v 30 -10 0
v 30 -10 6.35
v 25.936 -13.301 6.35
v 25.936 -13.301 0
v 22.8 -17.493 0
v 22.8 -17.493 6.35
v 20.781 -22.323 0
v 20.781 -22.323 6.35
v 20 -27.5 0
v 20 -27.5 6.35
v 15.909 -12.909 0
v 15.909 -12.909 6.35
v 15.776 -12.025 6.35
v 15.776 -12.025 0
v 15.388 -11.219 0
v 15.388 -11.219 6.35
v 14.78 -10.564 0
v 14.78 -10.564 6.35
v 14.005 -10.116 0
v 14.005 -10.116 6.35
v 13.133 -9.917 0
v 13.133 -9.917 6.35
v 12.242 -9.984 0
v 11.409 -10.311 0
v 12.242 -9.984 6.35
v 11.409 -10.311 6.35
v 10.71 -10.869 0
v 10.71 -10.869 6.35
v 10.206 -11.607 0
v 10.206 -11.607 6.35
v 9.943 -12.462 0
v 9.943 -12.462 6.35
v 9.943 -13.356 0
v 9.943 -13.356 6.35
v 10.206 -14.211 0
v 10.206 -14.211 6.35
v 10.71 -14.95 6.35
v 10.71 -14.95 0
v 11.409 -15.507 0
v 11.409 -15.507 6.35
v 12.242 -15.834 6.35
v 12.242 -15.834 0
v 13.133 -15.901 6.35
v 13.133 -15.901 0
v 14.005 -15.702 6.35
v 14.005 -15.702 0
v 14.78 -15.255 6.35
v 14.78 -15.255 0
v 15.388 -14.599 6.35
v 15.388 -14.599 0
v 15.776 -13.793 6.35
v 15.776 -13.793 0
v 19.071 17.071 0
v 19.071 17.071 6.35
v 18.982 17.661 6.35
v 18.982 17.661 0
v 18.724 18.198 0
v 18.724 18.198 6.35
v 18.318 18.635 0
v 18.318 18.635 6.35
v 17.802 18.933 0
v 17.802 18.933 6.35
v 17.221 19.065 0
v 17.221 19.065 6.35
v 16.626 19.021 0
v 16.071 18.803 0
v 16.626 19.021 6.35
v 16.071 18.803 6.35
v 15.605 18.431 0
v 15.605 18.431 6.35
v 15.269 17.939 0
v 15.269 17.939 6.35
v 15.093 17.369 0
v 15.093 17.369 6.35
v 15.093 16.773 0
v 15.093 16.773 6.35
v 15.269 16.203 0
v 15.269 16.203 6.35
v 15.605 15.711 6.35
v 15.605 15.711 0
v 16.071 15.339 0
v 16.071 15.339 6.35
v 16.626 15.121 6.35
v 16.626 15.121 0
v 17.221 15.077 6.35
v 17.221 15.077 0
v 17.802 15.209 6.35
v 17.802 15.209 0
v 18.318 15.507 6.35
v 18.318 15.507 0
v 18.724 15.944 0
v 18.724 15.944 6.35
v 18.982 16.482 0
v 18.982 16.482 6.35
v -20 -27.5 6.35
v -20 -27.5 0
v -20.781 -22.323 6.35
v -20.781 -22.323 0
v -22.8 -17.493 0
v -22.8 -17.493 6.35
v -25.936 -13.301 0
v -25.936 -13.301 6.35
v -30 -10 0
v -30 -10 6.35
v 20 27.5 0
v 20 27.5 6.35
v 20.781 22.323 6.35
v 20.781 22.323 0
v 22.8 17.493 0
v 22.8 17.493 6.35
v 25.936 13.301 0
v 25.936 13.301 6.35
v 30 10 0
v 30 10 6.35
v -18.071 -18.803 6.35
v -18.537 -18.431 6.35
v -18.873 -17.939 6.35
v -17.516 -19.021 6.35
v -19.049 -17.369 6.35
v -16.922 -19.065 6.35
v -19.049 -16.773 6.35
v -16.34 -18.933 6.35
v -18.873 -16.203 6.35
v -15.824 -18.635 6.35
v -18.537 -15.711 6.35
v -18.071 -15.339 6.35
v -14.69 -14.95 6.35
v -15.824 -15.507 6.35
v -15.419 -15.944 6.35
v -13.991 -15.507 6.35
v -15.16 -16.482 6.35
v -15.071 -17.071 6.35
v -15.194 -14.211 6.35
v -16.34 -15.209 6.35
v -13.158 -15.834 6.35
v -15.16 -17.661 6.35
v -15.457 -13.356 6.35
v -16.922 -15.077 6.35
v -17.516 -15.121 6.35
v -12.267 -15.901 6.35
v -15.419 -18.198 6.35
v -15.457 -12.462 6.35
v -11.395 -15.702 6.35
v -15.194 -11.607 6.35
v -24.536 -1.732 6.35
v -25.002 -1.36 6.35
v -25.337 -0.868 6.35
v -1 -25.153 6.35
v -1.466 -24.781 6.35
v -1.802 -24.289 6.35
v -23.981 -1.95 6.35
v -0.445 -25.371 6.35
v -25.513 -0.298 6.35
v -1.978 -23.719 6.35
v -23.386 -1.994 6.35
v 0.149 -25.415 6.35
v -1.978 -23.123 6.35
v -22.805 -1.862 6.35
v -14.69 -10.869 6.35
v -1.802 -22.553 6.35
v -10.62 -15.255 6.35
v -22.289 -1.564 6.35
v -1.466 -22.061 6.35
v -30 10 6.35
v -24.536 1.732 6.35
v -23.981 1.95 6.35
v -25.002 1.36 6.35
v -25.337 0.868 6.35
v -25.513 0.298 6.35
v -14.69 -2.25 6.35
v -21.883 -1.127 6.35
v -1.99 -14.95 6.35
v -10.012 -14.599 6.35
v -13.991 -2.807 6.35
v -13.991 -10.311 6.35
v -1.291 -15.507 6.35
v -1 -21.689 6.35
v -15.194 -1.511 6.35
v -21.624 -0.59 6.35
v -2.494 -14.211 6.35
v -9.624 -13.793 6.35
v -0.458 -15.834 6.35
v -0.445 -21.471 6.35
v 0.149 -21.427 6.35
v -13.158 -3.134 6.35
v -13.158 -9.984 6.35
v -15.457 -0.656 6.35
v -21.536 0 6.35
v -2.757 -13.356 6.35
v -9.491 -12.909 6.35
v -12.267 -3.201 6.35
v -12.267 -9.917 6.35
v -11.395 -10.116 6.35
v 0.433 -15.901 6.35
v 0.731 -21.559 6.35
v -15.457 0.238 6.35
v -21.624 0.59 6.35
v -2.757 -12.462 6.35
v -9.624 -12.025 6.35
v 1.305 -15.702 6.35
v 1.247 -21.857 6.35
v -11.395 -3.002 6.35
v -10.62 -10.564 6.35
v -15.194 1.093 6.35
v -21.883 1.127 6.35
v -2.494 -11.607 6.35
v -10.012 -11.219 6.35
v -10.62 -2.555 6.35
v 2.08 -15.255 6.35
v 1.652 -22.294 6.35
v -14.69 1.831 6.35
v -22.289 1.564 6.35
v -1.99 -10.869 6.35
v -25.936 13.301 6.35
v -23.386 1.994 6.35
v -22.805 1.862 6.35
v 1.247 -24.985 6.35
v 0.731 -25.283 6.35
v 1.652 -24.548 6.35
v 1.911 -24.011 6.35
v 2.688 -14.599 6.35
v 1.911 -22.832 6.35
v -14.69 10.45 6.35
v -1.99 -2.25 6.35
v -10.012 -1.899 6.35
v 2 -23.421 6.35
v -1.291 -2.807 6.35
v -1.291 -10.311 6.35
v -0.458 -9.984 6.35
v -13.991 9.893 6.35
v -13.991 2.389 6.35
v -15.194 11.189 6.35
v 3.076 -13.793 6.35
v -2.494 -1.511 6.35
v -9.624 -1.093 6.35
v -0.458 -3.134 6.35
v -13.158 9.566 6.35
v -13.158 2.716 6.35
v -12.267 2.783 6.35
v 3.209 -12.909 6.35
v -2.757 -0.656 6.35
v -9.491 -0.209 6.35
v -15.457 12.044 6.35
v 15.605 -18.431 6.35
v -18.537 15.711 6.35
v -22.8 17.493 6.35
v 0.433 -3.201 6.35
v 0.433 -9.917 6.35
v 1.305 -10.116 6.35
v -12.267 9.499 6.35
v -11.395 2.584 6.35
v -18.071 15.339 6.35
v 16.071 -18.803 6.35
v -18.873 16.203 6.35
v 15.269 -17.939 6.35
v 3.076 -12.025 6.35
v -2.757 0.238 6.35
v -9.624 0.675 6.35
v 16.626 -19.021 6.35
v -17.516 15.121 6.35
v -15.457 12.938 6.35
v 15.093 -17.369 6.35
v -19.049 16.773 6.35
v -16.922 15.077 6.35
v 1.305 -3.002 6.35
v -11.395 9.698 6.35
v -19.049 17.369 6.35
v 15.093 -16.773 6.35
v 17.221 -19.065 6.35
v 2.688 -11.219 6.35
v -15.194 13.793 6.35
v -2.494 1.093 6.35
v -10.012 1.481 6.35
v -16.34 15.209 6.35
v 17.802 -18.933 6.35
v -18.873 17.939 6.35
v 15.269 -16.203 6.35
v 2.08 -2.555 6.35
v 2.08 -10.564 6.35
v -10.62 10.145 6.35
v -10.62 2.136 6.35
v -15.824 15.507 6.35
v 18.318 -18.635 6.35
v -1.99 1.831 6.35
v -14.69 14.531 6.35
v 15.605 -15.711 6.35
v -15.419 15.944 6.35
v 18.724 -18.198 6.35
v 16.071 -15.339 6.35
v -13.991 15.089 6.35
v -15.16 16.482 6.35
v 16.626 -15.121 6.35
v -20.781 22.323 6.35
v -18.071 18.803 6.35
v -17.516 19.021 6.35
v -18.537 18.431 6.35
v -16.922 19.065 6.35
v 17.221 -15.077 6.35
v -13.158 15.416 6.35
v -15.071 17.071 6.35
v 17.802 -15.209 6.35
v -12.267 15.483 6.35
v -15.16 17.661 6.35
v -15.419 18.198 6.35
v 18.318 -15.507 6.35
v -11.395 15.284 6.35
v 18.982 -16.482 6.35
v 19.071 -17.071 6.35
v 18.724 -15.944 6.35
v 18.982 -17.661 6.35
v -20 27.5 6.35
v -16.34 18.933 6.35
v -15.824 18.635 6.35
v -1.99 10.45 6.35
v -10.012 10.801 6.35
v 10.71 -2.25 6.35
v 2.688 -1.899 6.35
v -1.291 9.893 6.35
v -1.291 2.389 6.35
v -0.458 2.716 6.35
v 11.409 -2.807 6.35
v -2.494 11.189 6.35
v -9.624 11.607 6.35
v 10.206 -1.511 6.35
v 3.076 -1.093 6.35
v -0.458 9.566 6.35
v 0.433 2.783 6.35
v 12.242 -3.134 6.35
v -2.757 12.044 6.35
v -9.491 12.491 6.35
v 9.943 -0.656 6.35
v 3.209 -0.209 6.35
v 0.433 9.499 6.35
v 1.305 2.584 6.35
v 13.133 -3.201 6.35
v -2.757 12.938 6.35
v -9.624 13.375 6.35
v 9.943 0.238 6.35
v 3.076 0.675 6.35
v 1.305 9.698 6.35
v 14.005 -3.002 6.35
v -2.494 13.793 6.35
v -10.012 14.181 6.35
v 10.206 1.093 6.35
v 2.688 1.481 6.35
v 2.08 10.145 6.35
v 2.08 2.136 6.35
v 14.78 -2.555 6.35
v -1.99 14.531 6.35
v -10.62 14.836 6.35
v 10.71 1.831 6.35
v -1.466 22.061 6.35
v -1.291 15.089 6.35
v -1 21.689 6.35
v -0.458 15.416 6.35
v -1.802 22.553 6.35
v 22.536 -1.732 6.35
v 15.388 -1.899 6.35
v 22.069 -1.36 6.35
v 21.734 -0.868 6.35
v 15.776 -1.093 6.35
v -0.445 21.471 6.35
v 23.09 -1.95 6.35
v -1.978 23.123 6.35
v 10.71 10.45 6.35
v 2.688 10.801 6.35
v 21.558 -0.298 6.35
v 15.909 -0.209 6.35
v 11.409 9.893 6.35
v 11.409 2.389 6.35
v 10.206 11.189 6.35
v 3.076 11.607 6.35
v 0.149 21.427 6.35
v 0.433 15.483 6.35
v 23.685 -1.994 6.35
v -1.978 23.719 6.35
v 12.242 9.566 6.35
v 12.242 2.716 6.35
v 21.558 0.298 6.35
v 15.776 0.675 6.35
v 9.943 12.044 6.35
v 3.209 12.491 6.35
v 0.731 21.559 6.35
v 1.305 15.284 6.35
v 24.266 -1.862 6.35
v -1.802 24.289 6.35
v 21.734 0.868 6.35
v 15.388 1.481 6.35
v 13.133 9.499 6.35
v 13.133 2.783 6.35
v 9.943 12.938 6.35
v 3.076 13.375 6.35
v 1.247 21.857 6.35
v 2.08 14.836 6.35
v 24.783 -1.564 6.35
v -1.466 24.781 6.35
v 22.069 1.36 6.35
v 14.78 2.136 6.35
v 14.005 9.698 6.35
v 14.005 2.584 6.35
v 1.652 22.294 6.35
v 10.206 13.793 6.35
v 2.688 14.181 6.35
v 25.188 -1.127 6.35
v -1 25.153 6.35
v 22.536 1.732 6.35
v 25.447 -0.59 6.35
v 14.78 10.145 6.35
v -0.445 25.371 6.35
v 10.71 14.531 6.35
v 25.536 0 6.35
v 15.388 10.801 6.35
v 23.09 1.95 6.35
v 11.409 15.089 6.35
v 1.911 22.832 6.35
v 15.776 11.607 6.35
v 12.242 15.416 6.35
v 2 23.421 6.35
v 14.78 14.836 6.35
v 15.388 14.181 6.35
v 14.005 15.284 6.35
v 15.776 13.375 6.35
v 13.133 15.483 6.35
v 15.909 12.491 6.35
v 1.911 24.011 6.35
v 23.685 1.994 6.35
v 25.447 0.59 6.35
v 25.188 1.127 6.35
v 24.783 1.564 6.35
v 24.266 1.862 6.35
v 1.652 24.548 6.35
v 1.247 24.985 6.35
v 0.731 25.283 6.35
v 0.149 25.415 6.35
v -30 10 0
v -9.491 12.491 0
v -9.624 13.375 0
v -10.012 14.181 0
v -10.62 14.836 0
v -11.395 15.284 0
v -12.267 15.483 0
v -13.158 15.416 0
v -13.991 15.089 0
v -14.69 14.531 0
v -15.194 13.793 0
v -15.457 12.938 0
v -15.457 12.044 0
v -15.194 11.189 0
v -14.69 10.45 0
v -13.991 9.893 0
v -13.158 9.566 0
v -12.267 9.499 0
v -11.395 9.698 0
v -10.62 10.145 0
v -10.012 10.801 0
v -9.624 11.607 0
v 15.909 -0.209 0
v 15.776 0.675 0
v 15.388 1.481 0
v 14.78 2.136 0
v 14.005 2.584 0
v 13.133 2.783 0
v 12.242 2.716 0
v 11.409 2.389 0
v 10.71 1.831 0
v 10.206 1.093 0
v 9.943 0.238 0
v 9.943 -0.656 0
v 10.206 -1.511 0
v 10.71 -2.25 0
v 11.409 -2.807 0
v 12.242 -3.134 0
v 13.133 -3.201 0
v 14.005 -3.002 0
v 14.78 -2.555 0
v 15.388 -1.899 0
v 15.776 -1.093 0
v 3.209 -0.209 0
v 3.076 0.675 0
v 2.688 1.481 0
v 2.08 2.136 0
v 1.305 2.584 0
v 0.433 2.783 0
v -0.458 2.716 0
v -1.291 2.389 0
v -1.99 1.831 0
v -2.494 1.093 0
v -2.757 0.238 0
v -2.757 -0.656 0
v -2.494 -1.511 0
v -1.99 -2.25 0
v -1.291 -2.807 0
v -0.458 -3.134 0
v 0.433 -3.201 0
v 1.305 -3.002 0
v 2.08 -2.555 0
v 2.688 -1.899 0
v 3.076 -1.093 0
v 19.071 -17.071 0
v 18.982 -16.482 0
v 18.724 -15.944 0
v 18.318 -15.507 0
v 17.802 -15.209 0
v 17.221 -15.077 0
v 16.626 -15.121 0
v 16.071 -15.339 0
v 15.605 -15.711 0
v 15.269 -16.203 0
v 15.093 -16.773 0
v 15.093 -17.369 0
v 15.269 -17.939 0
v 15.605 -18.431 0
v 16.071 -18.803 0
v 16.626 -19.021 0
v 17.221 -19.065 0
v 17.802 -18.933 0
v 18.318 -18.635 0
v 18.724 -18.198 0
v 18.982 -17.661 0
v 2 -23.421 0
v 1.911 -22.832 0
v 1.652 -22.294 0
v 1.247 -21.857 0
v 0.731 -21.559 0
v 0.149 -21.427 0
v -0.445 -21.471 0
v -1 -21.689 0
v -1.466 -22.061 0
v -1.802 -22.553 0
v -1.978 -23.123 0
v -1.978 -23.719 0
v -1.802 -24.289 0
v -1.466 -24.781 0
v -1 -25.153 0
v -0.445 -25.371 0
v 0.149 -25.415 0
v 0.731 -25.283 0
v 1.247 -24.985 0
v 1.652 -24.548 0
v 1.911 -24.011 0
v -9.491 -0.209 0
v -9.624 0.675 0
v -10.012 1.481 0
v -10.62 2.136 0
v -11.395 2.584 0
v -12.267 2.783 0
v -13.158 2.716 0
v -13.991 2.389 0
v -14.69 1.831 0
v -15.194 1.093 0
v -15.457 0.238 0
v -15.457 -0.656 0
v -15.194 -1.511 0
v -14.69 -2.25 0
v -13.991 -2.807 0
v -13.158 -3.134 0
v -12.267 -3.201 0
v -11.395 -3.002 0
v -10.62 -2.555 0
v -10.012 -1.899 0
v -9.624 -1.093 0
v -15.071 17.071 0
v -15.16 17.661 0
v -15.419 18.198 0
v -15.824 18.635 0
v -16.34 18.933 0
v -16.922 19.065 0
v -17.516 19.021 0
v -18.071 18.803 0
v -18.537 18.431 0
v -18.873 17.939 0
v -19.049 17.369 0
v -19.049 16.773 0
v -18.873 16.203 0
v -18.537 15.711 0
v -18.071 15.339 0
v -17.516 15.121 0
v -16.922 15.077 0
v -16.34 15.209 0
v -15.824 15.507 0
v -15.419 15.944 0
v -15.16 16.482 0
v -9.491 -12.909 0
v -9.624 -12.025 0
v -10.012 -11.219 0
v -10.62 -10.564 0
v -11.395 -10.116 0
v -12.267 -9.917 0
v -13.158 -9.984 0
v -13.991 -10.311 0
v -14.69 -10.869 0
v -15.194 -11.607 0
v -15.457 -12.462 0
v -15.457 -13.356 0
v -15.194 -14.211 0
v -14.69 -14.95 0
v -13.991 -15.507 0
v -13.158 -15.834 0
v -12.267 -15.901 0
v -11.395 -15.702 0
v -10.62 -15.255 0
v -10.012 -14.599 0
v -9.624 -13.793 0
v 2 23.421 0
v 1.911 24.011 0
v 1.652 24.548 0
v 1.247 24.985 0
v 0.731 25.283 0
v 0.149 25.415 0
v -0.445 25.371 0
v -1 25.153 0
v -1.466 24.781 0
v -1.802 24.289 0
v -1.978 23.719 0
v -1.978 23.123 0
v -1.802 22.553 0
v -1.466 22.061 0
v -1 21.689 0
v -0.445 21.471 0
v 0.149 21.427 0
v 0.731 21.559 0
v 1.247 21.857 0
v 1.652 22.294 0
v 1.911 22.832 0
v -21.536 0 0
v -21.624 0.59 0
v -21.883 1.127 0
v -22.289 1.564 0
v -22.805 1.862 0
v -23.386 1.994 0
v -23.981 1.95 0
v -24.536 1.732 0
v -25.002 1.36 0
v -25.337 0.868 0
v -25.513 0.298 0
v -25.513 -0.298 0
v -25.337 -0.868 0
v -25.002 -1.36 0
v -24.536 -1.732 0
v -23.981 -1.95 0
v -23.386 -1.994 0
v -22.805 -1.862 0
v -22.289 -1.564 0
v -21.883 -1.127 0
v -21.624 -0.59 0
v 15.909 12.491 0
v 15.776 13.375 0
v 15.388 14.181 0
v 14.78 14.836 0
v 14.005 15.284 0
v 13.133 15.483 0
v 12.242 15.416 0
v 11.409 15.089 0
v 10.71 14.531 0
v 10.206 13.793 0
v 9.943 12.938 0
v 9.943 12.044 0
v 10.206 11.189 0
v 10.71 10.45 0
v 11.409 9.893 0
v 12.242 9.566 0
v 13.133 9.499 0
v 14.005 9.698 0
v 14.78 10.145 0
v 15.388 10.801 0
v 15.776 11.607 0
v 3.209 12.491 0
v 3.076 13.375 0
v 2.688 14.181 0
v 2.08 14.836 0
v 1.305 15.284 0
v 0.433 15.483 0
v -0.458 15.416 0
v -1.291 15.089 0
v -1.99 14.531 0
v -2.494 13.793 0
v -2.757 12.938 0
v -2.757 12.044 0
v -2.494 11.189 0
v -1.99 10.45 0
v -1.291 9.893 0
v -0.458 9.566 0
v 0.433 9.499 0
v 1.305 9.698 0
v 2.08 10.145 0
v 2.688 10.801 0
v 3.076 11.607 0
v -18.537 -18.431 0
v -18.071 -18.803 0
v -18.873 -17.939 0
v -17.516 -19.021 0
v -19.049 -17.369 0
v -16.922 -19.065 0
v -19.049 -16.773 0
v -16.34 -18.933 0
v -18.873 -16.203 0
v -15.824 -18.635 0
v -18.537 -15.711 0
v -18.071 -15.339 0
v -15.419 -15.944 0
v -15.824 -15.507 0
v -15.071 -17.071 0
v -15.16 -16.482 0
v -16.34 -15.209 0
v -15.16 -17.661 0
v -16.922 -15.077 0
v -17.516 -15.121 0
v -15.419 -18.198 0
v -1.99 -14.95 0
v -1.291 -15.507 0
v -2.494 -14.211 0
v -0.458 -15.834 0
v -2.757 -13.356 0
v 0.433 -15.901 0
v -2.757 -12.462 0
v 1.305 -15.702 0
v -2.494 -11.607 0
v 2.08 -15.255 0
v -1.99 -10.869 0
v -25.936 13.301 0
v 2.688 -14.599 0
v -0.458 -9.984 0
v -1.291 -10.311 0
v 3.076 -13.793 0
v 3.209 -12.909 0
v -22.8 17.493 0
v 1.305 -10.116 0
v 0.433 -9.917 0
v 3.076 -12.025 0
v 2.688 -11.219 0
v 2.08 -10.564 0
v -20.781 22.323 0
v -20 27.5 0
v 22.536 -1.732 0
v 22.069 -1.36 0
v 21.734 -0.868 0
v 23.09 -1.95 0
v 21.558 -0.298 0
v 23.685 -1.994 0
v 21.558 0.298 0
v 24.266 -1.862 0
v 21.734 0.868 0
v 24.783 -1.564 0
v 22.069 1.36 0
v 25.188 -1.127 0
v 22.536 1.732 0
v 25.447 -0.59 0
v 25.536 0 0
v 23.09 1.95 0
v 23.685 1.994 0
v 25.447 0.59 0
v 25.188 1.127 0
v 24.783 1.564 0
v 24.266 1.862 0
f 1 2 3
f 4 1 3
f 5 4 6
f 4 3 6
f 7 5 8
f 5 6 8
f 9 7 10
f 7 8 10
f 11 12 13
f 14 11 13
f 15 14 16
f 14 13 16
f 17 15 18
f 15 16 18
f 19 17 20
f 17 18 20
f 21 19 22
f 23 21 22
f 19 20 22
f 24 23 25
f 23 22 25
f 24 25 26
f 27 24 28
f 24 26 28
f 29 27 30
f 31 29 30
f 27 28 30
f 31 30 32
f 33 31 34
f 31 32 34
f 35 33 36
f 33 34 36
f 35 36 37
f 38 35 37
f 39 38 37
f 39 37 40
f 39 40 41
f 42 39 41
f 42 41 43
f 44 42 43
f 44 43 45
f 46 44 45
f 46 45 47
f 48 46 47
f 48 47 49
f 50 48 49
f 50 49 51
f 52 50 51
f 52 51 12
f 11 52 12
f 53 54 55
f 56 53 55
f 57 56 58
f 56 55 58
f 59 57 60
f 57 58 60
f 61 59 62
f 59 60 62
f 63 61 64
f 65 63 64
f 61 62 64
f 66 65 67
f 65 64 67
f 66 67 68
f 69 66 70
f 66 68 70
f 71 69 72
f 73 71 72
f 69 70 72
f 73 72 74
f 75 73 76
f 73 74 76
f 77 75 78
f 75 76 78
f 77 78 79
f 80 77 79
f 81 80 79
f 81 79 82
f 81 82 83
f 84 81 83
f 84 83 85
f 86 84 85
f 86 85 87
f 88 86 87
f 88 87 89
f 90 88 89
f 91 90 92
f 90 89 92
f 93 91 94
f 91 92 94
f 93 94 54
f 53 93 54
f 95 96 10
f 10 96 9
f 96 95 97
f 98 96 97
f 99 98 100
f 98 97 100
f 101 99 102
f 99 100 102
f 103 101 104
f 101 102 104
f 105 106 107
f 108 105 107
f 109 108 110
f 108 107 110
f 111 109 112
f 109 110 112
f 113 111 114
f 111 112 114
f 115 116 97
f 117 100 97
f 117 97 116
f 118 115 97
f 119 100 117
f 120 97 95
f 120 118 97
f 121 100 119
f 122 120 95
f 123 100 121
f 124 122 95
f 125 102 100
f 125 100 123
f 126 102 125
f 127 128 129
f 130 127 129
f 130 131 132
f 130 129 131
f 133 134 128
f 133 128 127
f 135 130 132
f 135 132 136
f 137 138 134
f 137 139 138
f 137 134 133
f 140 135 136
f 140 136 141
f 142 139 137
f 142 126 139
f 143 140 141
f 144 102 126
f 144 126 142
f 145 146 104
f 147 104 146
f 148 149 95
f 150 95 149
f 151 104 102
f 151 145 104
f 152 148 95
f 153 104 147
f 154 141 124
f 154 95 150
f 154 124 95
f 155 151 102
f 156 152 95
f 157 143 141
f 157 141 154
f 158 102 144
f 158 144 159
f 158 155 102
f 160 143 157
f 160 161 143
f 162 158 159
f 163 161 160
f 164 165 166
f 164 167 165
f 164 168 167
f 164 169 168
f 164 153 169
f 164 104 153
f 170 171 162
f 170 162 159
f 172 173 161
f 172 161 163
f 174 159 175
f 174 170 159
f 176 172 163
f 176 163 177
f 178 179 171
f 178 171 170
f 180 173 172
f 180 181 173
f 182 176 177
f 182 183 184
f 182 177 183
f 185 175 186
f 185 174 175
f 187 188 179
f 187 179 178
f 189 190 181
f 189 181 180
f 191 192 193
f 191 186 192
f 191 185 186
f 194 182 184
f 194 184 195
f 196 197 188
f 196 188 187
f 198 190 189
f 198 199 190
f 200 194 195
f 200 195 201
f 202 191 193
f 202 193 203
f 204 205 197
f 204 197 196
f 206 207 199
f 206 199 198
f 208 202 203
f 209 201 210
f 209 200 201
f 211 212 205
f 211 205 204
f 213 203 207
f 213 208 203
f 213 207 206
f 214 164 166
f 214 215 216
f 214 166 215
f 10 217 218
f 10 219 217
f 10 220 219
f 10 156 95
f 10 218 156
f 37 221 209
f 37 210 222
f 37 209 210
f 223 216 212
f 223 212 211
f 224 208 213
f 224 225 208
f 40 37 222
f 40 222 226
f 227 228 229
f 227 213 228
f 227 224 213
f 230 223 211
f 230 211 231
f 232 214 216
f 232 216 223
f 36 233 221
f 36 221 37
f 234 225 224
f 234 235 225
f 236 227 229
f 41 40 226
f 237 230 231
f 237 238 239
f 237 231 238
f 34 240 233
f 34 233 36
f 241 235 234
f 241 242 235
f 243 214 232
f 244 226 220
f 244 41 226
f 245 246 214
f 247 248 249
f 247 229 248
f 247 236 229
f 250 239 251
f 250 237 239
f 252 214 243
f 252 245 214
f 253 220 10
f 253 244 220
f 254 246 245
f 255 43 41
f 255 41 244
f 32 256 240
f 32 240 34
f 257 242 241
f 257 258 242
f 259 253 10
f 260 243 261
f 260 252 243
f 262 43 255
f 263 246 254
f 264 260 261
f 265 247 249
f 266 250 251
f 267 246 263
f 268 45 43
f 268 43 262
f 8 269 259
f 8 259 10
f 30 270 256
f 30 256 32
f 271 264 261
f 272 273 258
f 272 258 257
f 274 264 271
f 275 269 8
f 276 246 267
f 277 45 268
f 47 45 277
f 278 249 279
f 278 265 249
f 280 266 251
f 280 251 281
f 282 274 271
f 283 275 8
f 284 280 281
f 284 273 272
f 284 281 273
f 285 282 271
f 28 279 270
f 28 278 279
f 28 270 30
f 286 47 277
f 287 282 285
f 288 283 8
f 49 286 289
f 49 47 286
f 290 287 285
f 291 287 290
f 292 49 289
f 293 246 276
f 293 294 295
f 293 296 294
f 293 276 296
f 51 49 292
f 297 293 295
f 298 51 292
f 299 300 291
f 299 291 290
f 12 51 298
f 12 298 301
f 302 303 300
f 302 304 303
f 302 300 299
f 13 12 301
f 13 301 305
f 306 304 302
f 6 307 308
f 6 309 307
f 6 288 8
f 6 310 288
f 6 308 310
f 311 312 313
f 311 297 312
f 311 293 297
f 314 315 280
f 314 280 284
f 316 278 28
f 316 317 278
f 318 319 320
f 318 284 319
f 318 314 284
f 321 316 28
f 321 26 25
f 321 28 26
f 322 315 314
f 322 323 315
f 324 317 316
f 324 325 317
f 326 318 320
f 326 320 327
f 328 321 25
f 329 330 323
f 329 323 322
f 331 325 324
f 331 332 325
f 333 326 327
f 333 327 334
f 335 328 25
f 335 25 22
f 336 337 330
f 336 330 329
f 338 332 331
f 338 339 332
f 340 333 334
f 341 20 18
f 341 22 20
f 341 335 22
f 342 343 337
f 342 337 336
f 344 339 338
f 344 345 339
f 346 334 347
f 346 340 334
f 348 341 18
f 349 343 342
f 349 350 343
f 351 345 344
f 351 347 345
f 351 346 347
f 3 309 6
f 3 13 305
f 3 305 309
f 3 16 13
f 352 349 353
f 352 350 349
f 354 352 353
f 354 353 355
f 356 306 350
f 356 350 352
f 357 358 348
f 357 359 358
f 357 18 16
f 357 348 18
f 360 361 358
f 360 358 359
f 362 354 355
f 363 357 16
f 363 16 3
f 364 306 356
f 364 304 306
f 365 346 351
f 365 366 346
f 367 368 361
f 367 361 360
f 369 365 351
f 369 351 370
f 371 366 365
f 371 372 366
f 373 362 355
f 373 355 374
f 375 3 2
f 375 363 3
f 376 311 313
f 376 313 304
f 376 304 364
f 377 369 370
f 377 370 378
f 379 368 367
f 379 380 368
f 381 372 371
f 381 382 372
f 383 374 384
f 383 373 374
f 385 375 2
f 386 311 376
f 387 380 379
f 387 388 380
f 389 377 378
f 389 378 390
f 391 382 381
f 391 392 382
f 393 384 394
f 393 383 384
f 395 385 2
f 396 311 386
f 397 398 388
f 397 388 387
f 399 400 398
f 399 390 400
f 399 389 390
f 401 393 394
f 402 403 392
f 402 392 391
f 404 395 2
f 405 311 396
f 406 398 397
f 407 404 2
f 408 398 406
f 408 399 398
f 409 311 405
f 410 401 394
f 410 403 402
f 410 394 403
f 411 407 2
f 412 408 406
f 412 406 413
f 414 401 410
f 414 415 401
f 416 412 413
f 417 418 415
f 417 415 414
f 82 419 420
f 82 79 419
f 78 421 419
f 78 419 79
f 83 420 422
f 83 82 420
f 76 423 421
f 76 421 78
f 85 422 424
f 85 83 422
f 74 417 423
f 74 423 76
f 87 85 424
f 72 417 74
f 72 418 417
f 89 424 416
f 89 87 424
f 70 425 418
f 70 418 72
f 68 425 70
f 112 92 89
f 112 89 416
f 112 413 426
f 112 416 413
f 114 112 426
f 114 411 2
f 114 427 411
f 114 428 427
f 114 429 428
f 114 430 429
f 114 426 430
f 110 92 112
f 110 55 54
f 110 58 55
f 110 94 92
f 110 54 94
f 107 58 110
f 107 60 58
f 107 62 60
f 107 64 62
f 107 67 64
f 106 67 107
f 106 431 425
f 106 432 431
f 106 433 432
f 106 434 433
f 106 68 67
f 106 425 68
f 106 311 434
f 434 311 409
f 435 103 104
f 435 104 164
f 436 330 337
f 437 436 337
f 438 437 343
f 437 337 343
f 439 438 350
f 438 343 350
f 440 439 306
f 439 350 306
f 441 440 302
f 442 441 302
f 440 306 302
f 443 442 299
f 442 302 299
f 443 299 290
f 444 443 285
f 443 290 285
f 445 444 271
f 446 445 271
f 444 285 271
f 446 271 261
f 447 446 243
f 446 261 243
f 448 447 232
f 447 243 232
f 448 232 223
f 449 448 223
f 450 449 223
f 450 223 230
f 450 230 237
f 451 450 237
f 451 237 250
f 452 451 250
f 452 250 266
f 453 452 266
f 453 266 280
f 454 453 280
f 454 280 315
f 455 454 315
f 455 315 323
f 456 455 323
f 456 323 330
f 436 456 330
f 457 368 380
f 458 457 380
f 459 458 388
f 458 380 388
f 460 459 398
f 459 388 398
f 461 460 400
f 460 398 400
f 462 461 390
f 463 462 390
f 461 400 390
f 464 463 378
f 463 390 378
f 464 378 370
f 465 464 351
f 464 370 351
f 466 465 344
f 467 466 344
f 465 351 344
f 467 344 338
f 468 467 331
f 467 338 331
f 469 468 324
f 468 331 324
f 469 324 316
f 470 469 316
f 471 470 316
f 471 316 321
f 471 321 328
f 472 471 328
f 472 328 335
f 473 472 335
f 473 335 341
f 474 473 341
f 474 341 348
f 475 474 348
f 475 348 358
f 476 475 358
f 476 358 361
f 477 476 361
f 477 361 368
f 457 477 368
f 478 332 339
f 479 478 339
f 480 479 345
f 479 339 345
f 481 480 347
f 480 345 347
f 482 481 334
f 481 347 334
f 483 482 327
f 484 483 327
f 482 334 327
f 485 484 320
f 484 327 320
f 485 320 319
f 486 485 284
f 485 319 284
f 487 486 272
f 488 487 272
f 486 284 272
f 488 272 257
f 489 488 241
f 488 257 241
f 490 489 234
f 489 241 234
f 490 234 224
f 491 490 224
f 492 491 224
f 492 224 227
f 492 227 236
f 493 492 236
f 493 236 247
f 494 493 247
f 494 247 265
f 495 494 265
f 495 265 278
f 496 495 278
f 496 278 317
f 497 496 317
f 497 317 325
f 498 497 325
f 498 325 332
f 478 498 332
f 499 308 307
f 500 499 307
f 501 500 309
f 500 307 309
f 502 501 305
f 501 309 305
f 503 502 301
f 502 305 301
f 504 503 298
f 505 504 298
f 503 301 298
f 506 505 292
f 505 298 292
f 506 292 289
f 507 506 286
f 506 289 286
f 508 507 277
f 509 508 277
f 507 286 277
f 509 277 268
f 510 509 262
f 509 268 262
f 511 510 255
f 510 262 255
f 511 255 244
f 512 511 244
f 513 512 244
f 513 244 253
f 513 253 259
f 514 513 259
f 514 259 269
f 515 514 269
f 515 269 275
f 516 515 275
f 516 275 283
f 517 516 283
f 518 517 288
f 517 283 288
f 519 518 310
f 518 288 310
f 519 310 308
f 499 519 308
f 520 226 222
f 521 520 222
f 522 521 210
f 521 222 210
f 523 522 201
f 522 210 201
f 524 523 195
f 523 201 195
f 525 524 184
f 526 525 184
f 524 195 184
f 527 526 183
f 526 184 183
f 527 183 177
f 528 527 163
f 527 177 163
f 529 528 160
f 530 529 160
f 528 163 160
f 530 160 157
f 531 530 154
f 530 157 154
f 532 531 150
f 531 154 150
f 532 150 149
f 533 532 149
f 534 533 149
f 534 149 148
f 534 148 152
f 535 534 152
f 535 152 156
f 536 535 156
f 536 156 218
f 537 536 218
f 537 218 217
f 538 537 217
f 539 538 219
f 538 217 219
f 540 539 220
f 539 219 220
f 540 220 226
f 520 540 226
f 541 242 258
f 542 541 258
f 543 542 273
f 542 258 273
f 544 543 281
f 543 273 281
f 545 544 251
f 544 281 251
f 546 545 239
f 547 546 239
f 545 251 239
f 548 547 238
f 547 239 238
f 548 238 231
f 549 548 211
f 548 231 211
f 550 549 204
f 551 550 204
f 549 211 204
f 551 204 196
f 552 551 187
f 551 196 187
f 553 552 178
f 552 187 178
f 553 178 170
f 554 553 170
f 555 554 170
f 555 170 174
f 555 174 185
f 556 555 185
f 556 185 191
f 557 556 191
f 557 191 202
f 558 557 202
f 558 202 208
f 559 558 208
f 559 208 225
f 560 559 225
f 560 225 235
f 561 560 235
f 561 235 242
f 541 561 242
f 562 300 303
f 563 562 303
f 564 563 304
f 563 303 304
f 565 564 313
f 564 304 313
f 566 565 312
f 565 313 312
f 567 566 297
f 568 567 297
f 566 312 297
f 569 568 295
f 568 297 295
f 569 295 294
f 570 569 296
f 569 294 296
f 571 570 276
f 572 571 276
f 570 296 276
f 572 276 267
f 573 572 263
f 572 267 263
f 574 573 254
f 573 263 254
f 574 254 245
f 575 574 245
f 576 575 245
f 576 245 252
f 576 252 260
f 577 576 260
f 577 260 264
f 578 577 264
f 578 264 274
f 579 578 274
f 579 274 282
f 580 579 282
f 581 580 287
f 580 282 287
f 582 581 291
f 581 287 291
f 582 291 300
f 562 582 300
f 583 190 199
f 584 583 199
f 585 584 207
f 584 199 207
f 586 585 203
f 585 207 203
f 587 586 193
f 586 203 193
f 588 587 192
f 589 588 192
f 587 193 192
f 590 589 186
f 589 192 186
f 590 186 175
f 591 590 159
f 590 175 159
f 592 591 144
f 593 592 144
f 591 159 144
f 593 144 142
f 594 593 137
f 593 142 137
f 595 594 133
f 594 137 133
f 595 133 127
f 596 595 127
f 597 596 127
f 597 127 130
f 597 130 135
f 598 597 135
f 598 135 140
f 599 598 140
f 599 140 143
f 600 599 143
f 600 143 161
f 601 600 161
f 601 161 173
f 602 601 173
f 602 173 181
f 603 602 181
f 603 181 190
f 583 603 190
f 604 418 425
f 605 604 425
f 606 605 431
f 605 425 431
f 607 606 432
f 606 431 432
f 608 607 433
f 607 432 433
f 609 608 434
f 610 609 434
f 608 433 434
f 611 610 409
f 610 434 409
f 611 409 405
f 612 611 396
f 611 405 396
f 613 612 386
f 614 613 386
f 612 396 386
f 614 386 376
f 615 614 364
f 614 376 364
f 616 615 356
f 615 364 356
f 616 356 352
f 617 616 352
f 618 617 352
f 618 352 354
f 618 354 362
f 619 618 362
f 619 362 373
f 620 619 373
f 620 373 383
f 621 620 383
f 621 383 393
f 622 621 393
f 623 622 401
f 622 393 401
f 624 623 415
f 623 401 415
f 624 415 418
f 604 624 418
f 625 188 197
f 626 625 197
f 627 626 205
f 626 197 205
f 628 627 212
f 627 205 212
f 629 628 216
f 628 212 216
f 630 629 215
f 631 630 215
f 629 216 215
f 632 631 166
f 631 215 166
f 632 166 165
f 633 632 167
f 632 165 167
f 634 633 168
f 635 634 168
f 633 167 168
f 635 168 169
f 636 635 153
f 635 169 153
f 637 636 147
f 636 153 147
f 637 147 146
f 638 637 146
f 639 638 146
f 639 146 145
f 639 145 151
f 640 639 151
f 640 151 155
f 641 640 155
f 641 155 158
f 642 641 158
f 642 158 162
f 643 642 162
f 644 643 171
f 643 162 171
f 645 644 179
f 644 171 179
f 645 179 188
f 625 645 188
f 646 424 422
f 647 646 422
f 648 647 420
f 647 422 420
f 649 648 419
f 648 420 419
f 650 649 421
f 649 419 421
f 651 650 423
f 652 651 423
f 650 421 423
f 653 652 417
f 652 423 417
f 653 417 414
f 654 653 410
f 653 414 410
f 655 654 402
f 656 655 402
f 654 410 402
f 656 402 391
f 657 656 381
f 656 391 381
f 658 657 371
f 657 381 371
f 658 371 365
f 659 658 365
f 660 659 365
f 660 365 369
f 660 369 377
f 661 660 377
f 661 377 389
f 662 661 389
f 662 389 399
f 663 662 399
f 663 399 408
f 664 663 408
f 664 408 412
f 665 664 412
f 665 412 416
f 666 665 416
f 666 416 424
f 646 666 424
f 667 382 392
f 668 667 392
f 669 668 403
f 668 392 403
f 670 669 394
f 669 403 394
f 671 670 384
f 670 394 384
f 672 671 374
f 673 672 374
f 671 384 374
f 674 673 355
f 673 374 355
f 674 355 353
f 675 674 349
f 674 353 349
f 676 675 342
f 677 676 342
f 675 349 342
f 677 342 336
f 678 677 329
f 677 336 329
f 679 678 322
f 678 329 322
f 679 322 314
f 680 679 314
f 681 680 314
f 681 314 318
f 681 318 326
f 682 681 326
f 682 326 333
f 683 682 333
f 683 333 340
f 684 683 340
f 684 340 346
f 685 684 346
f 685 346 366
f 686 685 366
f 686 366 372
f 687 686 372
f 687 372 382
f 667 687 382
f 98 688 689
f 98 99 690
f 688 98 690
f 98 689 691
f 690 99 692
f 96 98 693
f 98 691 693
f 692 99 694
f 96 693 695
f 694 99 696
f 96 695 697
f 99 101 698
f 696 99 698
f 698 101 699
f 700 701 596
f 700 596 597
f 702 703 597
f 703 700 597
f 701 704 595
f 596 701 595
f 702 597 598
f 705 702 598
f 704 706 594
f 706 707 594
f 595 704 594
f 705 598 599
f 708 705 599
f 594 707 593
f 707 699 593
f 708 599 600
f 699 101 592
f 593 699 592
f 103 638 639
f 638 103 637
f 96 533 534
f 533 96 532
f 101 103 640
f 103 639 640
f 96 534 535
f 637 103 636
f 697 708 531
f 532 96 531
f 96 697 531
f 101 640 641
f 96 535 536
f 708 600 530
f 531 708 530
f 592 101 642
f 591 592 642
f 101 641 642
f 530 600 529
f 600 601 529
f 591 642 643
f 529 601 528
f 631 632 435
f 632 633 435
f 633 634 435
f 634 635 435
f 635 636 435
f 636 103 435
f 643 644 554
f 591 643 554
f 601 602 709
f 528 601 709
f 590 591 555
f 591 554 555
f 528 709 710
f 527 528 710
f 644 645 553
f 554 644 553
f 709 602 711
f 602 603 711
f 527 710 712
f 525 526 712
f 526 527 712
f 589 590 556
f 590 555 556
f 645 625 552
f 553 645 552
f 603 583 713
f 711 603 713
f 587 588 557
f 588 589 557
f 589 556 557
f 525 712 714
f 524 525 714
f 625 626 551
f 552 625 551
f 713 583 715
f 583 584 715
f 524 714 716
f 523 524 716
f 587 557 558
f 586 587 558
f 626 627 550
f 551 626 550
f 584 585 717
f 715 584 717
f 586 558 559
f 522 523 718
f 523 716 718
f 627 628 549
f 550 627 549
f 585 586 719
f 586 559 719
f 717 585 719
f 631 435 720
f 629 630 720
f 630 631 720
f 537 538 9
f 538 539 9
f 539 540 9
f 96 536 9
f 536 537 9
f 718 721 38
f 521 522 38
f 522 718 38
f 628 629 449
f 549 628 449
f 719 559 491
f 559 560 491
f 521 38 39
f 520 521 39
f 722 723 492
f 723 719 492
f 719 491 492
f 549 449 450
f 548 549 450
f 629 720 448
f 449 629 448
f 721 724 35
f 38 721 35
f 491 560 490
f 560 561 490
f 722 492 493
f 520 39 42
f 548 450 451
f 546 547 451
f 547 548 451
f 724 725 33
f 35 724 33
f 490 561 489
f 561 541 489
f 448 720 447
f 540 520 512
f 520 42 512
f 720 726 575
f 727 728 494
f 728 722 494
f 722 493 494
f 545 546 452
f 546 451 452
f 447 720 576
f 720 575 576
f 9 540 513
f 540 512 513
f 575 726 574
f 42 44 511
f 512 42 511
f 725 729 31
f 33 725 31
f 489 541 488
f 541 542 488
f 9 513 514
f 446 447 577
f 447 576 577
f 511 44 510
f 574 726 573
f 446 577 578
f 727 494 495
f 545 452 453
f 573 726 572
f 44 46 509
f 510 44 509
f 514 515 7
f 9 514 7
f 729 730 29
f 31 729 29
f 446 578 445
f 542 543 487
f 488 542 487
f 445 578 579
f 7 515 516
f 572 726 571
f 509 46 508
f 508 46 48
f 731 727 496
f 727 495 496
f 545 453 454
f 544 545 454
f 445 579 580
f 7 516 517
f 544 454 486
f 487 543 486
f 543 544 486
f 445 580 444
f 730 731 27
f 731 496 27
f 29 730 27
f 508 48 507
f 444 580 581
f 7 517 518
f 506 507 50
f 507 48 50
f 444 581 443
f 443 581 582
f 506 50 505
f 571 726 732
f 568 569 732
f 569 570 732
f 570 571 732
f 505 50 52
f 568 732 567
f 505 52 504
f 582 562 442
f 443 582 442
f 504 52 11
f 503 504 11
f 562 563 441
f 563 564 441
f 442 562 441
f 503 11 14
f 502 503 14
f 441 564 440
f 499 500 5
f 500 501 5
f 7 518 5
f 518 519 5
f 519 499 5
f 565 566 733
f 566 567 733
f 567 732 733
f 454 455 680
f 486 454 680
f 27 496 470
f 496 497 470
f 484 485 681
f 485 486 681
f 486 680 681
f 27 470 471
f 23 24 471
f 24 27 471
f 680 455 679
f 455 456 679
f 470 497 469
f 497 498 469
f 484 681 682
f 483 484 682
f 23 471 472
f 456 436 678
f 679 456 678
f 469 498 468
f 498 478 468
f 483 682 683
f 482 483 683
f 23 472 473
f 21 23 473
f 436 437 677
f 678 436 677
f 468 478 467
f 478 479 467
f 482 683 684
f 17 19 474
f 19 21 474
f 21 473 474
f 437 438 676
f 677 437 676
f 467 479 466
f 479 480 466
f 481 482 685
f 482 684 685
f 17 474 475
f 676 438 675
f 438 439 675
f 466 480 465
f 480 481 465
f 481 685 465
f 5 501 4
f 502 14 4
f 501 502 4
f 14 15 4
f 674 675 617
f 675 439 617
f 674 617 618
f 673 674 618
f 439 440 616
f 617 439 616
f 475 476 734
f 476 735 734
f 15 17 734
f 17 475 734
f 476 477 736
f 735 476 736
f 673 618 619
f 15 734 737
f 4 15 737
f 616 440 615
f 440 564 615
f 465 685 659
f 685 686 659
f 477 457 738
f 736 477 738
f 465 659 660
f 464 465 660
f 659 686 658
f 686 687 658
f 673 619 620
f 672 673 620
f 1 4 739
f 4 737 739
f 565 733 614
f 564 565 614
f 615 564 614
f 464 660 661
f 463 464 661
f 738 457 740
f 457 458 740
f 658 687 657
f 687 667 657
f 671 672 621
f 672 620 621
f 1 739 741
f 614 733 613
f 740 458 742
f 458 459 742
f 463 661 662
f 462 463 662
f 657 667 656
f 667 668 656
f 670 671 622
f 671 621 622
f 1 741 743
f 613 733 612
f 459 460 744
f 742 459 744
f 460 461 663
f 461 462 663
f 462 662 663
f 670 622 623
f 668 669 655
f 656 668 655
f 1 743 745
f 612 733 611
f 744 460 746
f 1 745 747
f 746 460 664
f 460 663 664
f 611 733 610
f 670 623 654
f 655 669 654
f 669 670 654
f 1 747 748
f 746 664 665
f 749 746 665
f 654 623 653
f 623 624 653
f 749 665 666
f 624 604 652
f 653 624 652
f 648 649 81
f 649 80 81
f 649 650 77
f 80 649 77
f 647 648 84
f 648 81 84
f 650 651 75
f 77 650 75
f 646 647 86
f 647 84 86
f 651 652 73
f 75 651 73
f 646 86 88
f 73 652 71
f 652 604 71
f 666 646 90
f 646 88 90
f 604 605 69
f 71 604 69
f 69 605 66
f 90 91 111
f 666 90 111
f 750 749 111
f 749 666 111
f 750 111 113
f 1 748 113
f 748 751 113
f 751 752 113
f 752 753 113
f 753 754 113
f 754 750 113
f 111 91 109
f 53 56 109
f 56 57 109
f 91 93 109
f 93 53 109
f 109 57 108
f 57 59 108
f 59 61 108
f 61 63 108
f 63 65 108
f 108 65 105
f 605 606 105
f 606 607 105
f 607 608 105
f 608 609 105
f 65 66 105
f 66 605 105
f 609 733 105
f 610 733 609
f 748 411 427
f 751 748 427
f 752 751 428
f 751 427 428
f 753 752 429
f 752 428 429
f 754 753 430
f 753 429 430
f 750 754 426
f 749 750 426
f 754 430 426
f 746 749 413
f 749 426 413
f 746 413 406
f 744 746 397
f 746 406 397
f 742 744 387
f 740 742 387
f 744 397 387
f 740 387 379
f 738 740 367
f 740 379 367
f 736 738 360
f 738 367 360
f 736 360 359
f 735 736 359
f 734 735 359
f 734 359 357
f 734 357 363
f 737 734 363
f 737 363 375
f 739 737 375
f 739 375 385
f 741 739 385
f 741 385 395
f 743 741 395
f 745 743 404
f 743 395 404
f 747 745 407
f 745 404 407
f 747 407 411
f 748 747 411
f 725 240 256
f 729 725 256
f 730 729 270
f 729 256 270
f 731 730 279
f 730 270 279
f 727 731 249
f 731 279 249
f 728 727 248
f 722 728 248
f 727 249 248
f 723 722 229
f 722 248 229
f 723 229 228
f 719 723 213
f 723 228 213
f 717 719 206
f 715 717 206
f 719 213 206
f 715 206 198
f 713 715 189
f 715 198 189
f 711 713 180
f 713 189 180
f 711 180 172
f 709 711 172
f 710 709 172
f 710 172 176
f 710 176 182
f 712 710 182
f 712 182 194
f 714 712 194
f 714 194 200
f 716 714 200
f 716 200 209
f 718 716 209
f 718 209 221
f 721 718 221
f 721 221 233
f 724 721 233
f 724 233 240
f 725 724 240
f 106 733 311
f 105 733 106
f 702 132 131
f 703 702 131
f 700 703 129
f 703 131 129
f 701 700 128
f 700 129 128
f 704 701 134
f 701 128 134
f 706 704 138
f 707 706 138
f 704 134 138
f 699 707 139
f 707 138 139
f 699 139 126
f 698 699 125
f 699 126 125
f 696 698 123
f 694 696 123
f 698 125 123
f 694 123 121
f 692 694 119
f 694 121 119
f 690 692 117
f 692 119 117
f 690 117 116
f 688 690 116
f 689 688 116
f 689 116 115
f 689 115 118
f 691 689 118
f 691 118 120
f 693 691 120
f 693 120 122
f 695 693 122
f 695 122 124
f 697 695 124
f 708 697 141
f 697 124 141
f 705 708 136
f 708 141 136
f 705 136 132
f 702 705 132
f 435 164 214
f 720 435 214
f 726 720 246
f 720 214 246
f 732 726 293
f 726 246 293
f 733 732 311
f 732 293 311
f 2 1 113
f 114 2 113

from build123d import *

# Parameters (mm, degrees)
SKETCH1_W                 = 60
SKETCH1_H                 = 55
BOSS_EXTRUDE1_DEPTH       = 6.35
SKETCH2_R                 = 2
CUT_EXTRUDE1_DEPTH        = 6.35
SKETCH3_R                 = 3
CUT_EXTRUDE2_DEPTH        = 42.189470742
LPATTERN1_COUNT           = 3
LPATTERN1_PITCH           = 12.7
LPATTERN2_COUNT           = 3
LPATTERN2_PITCH           = 12.7
LPATTERN2_COPY_1_SKETCH_R = 3
LPATTERN2_COPY_1_DEPTH    = 42.189470742
LPATTERN2_COPY_2_SKETCH_R = 3
LPATTERN2_COPY_2_DEPTH    = 42.189470742
LPATTERN2_COPY_3_SKETCH_R = 3
LPATTERN2_COPY_3_DEPTH    = 42.189470742
LPATTERN2_COPY_4_SKETCH_R = 3
LPATTERN2_COPY_4_DEPTH    = 42.189470742


with BuildPart() as part:
    # Sketch1 → Boss-Extrude1 (new body)
    with BuildSketch(Plane.XY):
        Rectangle(SKETCH1_W, SKETCH1_H)
    extrude(amount=BOSS_EXTRUDE1_DEPTH)

    # Sketch2 → Cut-Extrude1 (cut)
    with BuildSketch(Plane.XY.offset(6.35)):
        with BuildLine():
            Line((-30, 27.5), (-30, 10))
            ThreePointArc((-30, 10), (-22.799858447, 17.492776255), (-20, 27.5))
            Line((-20, 27.5), (-30, 27.5))
        make_face()
        with BuildLine():
            ThreePointArc((-20, -27.5), (-22.799858447, -17.492776255), (-30, -10))
            Line((-30, -10), (-30, -27.5))
            Line((-30, -27.5), (-20, -27.5))
        make_face()
        with BuildLine():
            ThreePointArc((30, -10), (22.799858447, -17.492776255), (20, -27.5))
            Line((20, -27.5), (30, -27.5))
            Line((30, -27.5), (30, -10))
        make_face()
        with BuildLine():
            Line((30, 27.5), (20, 27.5))
            ThreePointArc((20, 27.5), (22.799858447, 17.492776255), (30, 10))
            Line((30, 10), (30, 27.5))
        make_face()
        with Locations((17.07106781, 17.07106781)):
            Circle(SKETCH2_R)
        with Locations((23.535533905, 0)):
            Circle(SKETCH2_R)
        with Locations((17.07106781, -17.07106781)):
            Circle(SKETCH2_R)
        with Locations((-17.07106781, -17.07106781)):
            Circle(SKETCH2_R)
        with Locations((-23.535533905, 0)):
            Circle(SKETCH2_R)
        with Locations((-17.07106781, 17.07106781)):
            Circle(SKETCH2_R)
        with Locations((0, -23.42106781)):
            Circle(SKETCH2_R)
        with Locations((0, 23.42106781)):
            Circle(SKETCH2_R)
    extrude(amount=-CUT_EXTRUDE1_DEPTH, mode=Mode.SUBTRACT)

    # Sketch3 → Cut-Extrude2 (cut, through all)
    with BuildSketch(Plane.XY.offset(6.35)):
        with Locations((-12.490915526, 12.490915526)):
            Circle(SKETCH3_R)
    cut_extrude2 = extrude(amount=-CUT_EXTRUDE2_DEPTH, mode=Mode.SUBTRACT)

    # LPattern1: Cut-Extrude2 ×3
    with Locations(*[(i * LPATTERN1_PITCH, 0, 0) for i in range(1, LPATTERN1_COUNT)]):
        add(cut_extrude2, mode=Mode.SUBTRACT)

    # LPattern2: Cut-Extrude2 ×3
    with Locations(*[(0, -i * LPATTERN2_PITCH, 0) for i in range(1, LPATTERN2_COUNT)]):
        add(cut_extrude2, mode=Mode.SUBTRACT)

    # LPattern2 copy 1 sketch → LPattern2 copy 1 (cut, through all)
    with BuildSketch(Plane(origin=(12.7, -12.7, 6.35), x_dir=(1, 0, 0), z_dir=(0, 0, 1))):
        with Locations((-12.490915526, 12.490915526)):
            Circle(LPATTERN2_COPY_1_SKETCH_R)
    extrude(amount=-LPATTERN2_COPY_1_DEPTH, mode=Mode.SUBTRACT)

    # LPattern2 copy 2 sketch → LPattern2 copy 2 (cut, through all)
    with BuildSketch(Plane(origin=(12.7, -25.4, 6.35), x_dir=(1, 0, 0), z_dir=(0, 0, 1))):
        with Locations((-12.490915526, 12.490915526)):
            Circle(LPATTERN2_COPY_2_SKETCH_R)
    extrude(amount=-LPATTERN2_COPY_2_DEPTH, mode=Mode.SUBTRACT)

    # LPattern2 copy 3 sketch → LPattern2 copy 3 (cut, through all)
    with BuildSketch(Plane(origin=(25.4, -12.7, 6.35), x_dir=(1, 0, 0), z_dir=(0, 0, 1))):
        with Locations((-12.490915526, 12.490915526)):
            Circle(LPATTERN2_COPY_3_SKETCH_R)
    extrude(amount=-LPATTERN2_COPY_3_DEPTH, mode=Mode.SUBTRACT)

    # LPattern2 copy 4 sketch → LPattern2 copy 4 (cut, through all)
    with BuildSketch(Plane(origin=(25.4, -25.4, 6.35), x_dir=(1, 0, 0), z_dir=(0, 0, 1))):
        with Locations((-12.490915526, 12.490915526)):
            Circle(LPATTERN2_COPY_4_SKETCH_R)
    extrude(amount=-LPATTERN2_COPY_4_DEPTH, mode=Mode.SUBTRACT)


solid = part.part
